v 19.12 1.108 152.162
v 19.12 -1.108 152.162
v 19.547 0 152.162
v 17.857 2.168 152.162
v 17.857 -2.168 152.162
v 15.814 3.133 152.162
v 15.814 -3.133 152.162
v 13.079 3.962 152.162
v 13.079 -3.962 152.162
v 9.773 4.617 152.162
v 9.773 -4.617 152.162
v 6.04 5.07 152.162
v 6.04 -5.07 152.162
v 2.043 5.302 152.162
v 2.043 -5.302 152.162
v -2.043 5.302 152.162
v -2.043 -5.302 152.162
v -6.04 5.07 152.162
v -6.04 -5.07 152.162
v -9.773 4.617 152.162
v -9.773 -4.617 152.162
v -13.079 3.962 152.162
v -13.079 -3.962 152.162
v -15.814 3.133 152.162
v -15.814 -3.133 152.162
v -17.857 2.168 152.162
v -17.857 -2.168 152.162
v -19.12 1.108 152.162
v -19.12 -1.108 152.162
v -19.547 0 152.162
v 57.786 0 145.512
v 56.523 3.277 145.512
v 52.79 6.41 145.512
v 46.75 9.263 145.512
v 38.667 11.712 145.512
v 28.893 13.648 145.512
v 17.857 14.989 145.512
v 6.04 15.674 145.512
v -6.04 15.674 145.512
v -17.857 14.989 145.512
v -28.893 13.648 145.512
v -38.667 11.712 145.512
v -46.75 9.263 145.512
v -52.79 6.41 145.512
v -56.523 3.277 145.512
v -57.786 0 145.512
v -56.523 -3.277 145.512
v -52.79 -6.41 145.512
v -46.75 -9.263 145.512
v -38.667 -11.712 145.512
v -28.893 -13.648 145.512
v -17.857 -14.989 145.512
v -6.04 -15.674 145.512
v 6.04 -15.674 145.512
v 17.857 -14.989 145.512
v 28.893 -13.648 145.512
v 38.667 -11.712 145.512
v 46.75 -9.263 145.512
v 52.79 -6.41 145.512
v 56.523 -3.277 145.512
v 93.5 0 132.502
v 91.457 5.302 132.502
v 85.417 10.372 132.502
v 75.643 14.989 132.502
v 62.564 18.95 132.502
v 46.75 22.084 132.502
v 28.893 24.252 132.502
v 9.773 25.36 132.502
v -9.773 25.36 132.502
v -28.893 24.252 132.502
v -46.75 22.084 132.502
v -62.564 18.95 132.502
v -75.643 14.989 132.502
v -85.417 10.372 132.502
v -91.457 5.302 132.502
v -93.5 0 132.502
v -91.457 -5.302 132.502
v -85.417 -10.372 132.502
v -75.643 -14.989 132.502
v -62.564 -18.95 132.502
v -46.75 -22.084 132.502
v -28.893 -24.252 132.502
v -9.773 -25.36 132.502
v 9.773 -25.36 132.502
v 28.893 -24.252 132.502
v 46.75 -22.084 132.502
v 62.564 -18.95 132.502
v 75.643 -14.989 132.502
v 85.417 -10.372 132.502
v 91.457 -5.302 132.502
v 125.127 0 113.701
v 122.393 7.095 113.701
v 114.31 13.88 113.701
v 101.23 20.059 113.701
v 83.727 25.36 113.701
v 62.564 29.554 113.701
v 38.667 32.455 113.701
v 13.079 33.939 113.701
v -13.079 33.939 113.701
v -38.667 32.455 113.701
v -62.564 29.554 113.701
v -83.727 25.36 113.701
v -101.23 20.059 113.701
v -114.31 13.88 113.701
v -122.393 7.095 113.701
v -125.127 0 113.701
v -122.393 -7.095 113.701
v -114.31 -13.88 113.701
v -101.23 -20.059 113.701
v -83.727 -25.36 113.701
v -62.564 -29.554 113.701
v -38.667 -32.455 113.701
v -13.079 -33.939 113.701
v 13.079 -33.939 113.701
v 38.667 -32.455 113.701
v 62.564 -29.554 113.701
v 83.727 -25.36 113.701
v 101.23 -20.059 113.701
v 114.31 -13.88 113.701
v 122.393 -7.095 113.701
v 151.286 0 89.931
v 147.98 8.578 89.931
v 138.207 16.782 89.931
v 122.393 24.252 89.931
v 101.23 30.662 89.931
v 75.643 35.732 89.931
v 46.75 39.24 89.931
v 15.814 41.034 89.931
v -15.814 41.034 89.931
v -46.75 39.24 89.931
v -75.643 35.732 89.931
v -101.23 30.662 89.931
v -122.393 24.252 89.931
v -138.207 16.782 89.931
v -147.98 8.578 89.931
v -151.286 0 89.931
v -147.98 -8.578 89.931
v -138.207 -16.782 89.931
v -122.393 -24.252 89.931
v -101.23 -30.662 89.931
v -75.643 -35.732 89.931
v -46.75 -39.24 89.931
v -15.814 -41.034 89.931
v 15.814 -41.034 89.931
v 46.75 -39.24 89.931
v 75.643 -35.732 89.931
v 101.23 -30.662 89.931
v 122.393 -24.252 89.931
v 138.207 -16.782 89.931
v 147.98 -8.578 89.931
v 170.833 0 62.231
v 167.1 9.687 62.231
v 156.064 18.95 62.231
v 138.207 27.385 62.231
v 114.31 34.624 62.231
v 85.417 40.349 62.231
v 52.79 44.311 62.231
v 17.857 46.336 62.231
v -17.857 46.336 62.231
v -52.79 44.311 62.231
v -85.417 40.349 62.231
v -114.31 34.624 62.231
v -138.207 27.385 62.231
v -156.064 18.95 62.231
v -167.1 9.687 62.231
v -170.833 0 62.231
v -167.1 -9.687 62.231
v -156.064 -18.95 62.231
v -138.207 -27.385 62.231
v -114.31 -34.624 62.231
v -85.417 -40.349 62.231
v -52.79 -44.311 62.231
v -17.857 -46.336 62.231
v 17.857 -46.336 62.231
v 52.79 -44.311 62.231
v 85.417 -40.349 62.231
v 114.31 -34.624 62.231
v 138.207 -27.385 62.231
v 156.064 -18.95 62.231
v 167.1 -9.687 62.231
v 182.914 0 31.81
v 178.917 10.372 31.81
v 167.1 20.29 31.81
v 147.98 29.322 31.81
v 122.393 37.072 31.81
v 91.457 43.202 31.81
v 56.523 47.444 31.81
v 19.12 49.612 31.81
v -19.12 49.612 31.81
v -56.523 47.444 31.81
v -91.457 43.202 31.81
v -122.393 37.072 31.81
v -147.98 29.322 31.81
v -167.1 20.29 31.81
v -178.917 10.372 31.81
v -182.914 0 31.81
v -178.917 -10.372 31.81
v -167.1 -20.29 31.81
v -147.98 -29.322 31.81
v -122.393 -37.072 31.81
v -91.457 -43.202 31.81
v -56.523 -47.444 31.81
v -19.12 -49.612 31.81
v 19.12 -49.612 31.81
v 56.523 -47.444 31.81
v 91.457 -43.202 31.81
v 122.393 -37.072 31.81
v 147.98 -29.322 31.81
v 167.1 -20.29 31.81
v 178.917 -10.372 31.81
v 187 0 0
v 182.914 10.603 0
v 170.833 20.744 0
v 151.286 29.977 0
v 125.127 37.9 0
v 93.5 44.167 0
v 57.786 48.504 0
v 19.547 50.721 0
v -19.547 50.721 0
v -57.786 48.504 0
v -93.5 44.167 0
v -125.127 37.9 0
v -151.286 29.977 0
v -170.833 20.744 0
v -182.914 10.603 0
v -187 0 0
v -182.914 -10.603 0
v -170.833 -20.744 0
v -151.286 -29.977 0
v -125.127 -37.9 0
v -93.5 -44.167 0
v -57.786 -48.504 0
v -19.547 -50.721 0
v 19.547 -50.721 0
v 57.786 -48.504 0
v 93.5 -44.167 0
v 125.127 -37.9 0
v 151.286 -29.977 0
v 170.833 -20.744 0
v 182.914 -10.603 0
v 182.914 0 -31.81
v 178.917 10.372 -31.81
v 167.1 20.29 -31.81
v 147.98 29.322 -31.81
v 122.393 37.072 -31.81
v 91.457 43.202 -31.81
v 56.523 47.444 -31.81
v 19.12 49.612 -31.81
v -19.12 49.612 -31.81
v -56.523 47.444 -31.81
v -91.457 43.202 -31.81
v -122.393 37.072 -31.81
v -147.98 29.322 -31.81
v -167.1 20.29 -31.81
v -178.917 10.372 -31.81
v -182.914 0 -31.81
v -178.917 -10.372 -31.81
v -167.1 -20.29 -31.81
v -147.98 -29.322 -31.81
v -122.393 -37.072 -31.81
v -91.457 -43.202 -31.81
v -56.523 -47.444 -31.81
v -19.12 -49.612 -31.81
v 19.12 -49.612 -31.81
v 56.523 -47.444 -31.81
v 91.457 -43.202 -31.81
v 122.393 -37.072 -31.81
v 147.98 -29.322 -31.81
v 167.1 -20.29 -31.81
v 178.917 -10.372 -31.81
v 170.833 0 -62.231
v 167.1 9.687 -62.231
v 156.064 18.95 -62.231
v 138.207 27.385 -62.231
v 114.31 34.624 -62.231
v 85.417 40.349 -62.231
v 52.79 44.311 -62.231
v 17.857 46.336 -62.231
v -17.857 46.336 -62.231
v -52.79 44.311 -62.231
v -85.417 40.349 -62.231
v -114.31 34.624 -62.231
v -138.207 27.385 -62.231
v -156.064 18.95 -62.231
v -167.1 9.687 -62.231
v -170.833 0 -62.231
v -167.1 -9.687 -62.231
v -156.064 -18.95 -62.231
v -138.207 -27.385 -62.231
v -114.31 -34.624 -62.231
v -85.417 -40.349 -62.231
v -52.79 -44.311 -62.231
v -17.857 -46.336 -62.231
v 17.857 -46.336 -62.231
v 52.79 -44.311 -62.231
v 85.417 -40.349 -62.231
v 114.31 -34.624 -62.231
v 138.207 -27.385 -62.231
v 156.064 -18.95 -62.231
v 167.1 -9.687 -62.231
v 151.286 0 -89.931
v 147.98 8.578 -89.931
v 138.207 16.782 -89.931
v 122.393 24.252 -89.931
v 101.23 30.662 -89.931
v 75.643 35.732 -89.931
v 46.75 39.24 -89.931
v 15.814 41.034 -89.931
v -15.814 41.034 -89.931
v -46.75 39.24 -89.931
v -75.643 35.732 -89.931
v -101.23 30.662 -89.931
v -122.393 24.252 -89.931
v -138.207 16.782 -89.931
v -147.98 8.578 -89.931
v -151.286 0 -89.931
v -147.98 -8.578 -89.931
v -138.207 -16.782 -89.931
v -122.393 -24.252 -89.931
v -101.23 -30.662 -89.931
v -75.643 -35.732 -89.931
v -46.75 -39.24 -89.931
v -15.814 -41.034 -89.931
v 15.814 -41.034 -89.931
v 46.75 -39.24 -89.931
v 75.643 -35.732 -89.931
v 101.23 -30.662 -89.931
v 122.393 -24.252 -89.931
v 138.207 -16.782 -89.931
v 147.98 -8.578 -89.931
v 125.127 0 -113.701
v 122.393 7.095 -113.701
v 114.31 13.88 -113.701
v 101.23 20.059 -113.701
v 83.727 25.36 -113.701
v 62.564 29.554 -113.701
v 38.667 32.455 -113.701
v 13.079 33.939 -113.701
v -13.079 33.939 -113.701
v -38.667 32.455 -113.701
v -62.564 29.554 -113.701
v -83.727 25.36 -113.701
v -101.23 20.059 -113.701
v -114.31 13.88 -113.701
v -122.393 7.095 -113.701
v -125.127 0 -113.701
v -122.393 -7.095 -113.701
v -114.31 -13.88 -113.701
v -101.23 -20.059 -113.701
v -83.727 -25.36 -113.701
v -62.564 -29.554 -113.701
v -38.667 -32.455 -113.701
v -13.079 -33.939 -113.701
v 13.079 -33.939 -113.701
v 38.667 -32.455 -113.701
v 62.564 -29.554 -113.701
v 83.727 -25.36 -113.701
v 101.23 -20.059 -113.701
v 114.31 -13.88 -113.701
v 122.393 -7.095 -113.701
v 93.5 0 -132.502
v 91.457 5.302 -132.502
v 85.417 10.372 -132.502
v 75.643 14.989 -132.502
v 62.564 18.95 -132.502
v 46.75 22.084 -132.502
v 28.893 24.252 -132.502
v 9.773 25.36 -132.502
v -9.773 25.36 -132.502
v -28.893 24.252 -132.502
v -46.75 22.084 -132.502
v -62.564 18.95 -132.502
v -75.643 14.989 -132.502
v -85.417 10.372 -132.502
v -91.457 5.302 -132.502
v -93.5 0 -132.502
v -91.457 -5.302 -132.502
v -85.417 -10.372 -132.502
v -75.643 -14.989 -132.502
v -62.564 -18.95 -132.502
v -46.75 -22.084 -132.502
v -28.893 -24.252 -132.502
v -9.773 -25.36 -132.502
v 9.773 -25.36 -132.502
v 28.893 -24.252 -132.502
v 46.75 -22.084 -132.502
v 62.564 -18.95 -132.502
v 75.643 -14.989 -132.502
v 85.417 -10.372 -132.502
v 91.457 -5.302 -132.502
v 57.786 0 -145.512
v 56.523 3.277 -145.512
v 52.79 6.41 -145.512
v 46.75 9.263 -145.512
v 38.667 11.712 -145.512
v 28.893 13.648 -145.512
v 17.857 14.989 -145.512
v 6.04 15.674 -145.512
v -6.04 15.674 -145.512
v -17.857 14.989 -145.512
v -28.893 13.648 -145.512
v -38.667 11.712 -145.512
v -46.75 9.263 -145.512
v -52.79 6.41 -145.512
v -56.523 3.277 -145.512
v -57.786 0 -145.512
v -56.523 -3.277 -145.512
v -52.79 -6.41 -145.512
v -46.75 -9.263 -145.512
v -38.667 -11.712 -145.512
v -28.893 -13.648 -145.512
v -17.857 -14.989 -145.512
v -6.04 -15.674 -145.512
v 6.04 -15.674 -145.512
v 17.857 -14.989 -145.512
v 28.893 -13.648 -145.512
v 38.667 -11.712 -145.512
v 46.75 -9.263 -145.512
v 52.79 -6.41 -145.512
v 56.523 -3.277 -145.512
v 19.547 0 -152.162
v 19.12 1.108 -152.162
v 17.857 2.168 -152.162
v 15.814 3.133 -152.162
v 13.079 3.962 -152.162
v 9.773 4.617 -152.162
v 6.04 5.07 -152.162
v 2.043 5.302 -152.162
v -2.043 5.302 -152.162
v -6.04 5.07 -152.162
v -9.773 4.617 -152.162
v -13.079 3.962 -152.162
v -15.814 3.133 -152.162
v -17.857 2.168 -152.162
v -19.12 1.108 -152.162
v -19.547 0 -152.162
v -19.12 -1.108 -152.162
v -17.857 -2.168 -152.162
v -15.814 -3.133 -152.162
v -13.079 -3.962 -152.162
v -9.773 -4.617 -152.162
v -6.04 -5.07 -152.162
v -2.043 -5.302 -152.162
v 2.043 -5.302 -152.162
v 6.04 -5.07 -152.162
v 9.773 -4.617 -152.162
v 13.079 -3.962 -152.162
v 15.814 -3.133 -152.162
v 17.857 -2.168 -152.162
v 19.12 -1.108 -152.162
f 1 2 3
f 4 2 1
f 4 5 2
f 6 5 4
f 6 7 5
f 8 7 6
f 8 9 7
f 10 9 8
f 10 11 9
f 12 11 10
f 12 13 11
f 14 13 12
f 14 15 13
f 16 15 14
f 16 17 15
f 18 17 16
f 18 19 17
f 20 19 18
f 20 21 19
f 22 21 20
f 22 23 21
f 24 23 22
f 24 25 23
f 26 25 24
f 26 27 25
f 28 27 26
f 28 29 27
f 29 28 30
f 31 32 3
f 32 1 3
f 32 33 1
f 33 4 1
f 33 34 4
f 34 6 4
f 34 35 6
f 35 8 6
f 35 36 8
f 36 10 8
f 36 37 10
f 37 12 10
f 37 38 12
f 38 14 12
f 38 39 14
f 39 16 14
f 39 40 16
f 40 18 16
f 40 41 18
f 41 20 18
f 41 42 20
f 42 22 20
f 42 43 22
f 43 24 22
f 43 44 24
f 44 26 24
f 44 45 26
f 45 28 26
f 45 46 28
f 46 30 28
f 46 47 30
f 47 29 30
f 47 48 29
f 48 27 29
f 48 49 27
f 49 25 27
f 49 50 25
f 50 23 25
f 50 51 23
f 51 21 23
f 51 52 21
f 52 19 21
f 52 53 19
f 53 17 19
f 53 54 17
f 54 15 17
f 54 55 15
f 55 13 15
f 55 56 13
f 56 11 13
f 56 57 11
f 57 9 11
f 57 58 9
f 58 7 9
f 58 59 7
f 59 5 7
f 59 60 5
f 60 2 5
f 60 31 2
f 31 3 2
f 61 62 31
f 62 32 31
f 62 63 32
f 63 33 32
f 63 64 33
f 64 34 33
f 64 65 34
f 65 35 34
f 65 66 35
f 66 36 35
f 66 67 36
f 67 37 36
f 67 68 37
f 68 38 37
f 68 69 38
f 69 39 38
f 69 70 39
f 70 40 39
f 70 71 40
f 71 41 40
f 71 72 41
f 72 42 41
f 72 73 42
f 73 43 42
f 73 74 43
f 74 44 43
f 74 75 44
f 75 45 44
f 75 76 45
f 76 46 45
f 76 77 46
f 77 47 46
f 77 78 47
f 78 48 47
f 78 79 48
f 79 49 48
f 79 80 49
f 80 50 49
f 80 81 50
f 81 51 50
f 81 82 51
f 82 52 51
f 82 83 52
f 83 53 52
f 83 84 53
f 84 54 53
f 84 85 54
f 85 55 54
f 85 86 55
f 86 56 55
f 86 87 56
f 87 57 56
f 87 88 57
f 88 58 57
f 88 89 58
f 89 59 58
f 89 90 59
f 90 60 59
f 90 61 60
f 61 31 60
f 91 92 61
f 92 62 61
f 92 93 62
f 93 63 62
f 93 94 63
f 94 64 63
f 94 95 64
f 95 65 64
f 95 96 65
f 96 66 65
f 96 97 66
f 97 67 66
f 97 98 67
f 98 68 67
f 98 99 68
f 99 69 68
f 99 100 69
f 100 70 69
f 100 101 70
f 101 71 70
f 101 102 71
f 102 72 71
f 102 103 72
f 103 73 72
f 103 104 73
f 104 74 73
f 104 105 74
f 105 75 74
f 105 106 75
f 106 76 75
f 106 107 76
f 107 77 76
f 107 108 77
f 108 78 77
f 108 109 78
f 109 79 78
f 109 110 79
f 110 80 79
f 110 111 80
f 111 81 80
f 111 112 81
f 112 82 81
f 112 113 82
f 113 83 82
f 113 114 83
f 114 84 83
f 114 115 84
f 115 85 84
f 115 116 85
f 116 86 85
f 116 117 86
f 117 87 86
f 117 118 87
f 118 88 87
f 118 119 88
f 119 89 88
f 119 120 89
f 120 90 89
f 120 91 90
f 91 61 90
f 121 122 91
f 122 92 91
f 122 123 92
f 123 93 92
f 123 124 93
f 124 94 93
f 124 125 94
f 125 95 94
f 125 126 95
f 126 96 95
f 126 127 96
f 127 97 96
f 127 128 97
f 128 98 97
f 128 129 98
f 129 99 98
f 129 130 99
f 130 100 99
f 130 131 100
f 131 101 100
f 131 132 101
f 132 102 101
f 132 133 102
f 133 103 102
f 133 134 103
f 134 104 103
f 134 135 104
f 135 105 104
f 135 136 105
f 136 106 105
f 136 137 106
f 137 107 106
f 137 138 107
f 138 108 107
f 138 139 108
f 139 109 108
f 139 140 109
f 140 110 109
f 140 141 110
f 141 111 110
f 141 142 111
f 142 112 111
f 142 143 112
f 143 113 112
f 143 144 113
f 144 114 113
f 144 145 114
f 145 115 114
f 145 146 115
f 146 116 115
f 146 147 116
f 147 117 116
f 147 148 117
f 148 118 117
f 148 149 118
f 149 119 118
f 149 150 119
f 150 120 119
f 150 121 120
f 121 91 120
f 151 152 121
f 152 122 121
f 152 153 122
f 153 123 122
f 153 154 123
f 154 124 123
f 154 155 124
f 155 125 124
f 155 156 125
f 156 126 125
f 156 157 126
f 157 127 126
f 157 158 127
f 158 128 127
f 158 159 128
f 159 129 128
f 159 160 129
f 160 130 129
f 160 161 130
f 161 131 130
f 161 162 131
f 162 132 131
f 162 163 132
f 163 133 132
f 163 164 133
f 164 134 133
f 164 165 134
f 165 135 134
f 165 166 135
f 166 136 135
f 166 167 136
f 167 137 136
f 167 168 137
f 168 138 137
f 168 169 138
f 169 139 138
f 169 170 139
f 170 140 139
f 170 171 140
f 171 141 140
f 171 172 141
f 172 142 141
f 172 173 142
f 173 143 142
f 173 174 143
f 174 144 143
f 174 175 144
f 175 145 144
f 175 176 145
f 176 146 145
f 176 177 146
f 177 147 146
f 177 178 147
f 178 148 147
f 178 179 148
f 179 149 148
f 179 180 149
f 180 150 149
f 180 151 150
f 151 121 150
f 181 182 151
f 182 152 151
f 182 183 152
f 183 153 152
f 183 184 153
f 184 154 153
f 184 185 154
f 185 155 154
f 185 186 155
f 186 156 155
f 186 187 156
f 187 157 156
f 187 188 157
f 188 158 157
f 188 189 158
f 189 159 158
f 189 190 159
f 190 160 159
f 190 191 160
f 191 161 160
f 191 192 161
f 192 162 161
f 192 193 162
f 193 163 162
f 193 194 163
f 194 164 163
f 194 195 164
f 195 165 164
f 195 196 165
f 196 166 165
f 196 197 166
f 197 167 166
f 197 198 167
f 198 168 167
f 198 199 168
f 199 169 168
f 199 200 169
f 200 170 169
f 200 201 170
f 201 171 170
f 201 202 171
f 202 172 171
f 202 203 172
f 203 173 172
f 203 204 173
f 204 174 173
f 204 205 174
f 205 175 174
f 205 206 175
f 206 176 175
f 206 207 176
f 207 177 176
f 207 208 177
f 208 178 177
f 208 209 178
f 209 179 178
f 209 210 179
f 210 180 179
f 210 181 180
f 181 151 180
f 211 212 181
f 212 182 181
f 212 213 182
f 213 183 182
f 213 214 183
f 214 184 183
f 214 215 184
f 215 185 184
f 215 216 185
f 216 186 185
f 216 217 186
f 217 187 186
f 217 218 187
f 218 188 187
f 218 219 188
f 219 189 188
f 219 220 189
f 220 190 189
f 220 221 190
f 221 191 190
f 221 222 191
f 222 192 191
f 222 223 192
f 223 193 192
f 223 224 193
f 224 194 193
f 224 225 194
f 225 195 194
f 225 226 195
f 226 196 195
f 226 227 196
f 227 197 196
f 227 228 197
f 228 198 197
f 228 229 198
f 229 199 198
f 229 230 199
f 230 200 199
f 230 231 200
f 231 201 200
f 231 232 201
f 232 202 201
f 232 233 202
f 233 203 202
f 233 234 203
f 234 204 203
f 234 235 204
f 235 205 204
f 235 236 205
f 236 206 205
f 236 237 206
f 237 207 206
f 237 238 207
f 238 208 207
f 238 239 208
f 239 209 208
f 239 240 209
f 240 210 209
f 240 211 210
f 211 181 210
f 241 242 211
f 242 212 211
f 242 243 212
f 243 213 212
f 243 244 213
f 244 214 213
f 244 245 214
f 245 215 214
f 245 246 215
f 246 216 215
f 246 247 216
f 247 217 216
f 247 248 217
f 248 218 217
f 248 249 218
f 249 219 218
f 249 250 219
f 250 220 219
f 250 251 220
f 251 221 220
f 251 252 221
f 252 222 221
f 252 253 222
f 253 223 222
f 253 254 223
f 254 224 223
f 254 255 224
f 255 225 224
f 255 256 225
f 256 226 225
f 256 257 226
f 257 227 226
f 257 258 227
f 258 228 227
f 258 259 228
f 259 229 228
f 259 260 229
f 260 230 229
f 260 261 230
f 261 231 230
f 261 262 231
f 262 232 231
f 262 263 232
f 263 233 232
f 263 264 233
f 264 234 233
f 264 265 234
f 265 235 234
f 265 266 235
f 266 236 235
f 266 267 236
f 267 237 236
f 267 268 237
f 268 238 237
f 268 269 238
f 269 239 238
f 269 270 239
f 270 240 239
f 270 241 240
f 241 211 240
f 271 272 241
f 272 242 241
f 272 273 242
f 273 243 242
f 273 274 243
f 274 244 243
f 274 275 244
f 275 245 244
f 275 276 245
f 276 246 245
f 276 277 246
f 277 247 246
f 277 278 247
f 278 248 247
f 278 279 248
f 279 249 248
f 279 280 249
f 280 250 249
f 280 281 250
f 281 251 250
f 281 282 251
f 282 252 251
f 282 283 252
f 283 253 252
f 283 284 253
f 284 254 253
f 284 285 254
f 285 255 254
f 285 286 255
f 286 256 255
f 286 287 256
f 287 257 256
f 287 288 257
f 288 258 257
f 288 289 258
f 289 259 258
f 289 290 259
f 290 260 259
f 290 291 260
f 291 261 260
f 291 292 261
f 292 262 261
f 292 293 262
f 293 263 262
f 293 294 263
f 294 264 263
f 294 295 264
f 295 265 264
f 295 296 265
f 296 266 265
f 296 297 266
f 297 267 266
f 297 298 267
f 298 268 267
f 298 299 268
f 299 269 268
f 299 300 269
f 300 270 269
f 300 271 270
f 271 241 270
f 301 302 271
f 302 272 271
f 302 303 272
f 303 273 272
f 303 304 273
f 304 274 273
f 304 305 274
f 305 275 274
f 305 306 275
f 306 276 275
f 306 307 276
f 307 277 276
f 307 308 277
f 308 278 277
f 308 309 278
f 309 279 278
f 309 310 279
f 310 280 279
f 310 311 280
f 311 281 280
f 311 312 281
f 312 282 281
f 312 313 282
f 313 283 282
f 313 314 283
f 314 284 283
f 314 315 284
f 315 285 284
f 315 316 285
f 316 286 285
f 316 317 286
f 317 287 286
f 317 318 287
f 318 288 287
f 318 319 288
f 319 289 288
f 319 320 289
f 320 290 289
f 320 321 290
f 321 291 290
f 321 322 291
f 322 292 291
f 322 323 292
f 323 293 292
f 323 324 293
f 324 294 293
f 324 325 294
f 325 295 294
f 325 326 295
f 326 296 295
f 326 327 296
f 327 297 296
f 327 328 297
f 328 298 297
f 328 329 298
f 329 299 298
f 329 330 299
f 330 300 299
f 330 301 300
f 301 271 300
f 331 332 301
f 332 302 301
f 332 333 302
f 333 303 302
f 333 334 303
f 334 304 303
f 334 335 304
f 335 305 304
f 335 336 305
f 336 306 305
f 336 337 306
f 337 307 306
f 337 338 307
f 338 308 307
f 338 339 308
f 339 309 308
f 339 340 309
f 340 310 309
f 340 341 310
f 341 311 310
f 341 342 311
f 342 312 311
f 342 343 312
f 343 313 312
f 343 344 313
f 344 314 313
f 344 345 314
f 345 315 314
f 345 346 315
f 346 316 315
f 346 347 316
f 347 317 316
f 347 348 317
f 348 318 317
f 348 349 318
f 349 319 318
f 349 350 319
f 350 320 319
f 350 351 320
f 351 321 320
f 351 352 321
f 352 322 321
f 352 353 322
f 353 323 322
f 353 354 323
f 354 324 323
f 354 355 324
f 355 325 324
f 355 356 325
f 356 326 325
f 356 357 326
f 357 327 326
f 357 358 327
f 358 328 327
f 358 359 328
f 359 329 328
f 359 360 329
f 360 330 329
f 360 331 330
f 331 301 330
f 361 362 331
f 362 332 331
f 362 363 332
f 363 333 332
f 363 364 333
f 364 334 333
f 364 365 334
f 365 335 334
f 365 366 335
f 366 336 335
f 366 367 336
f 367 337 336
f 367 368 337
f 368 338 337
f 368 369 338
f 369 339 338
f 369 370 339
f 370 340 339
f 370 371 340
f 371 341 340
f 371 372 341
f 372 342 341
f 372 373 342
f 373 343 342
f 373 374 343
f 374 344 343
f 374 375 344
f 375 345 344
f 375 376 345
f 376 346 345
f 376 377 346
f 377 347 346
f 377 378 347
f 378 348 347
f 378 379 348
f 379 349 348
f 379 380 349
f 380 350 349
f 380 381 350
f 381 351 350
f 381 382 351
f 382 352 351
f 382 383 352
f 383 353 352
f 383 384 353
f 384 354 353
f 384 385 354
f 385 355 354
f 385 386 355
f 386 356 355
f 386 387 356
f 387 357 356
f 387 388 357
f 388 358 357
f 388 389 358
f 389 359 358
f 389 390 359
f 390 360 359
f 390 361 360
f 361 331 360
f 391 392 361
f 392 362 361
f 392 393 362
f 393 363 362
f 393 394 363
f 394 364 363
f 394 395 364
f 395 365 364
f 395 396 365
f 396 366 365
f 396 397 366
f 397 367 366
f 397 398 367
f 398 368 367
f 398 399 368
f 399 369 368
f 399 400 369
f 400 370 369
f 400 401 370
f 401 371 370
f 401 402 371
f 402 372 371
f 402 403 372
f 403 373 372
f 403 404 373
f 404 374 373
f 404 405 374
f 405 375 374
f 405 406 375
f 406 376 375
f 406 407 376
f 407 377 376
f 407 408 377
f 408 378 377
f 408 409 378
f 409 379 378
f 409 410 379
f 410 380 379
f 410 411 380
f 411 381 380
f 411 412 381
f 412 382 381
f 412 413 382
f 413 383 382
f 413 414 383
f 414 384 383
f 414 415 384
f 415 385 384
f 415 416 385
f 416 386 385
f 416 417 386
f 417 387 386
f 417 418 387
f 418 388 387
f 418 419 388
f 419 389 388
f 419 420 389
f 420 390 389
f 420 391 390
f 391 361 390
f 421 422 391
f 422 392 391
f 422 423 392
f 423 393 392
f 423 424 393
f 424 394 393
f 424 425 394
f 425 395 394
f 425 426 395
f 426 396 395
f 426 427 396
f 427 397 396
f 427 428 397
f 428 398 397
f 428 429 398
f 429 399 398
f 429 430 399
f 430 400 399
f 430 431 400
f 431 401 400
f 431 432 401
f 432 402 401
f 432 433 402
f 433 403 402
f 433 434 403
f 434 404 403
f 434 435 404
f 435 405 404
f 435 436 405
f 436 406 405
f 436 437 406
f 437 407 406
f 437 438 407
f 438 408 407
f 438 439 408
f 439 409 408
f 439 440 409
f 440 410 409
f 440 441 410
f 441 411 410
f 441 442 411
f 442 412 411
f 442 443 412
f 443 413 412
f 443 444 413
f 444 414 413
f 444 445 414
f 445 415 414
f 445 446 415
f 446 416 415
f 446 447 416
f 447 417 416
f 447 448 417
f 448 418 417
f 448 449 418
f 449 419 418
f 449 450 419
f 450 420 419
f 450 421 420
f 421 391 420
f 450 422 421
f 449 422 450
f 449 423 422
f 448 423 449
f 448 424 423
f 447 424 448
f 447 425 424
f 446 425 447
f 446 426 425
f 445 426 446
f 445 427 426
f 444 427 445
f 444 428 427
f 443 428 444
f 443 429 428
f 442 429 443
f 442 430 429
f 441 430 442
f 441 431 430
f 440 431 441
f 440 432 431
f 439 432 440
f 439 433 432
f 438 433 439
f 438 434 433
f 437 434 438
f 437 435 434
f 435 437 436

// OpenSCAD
// Generated by SolidPython 1.0.1 on 2020-07-29 00:46:49


scale(v = [11, 3, 9]) {
	sphere(r = 17);
}
/***********************************************
*********      SolidPython code:      **********
************************************************
 
# import packages: SolidPython
from solid import *
from solid.utils import *
from itertools import chain, combinations, permutations


class Resize:

    def __init__(self, scad_file):
        self.scad_file = scad_file
        #self.scad_file = import_scad(scad_file)
        # cone/cylinder param:
        self.r1 = 0
        self.r2 = 0
        self.h = 0
        # rectangular prism param:
        self.w = 0
        self.l = 0
        # ellipse param:
        self.r = 0

    # import OpenScad code (file name corresponds to shape)


    # classify shape + parameters
    def assign(self, param1, param2, param3):
        if self.scad_file == 'cone.scad':
            self.r1 = param1
            self.r2 = param2
            self.h = param3
        elif self.scad_file == 'cylinder.scad':
            self.r1 = param1
            self.r2 = param2
            self.h = param3
        elif self.scad_file == 'rectangularPrism.scad':
            self.h = param1
            self.l = param2
            self.w = param3
        else:
            self.r = param1
            self.h = param2

    # resize parameters
    def iterate(self):
        x = range(3, 20, 2)
        i = 1
        if self.scad_file == 'cone.scad':
            tempList = list(permutations(x, 2))
            for temp in tempList:
                param1 = temp[0]
                param2 = temp[1]
                filepath = 'produced_scad_files/' + 'cone' + str(param1) + '_' + str(param2) + '_' + '.scad'
                scad_render_to_file(cylinder(h=param1, r1=param2, r2=0), filepath)

        elif self.scad_file == 'cylinder.scad':
            tempList = list(permutations(x, 3))
            for temp in tempList:
                param1 = temp[0]
                param2 = temp[1]
                filepath = 'produced_scad_files/' + 'cylinder' + str(param1) + '_' + str(param2) + '_' + '.scad'
                scad_render_to_file(cylinder(h=param1, r1=param2, r2=param2), filepath)

        elif self.scad_file == 'rectangularPrism.scad':
            tempList = list(permutations(x, 3))
            for temp in tempList:
                param1 = temp[0]
                param2 = temp[1]
                param3 = temp[2]
                filepath = 'produced_scad_files/' + 'rectangularPrism' + str(param1) + '_' + str(param2) + '_' + str(
                    param3) + '.scad'
                scad_render_to_file(cube(size=(param1, param2, param3)), filepath)

        elif self.scad_file == 'ellipse.scad':
            tempList = list(permutations(x, 4))
            for temp in tempList:
                param1 = temp[0]
                param2 = temp[1]
                param3 = temp[2]
                param4 = temp[3]
                filepath = 'produced_scad_files/' + 'ellipse' + str(param1) + '_' + str(param2) + '_' + str(param3) + '_' + str(param4) + '.scad'
                scad_render_to_file(scale([param1, param2, param3])(sphere(r=param4)), filepath)

    def render_to_scadfile(self):
        scad_render_to_file(scad, 'example.scad') 
 
************************************************/
